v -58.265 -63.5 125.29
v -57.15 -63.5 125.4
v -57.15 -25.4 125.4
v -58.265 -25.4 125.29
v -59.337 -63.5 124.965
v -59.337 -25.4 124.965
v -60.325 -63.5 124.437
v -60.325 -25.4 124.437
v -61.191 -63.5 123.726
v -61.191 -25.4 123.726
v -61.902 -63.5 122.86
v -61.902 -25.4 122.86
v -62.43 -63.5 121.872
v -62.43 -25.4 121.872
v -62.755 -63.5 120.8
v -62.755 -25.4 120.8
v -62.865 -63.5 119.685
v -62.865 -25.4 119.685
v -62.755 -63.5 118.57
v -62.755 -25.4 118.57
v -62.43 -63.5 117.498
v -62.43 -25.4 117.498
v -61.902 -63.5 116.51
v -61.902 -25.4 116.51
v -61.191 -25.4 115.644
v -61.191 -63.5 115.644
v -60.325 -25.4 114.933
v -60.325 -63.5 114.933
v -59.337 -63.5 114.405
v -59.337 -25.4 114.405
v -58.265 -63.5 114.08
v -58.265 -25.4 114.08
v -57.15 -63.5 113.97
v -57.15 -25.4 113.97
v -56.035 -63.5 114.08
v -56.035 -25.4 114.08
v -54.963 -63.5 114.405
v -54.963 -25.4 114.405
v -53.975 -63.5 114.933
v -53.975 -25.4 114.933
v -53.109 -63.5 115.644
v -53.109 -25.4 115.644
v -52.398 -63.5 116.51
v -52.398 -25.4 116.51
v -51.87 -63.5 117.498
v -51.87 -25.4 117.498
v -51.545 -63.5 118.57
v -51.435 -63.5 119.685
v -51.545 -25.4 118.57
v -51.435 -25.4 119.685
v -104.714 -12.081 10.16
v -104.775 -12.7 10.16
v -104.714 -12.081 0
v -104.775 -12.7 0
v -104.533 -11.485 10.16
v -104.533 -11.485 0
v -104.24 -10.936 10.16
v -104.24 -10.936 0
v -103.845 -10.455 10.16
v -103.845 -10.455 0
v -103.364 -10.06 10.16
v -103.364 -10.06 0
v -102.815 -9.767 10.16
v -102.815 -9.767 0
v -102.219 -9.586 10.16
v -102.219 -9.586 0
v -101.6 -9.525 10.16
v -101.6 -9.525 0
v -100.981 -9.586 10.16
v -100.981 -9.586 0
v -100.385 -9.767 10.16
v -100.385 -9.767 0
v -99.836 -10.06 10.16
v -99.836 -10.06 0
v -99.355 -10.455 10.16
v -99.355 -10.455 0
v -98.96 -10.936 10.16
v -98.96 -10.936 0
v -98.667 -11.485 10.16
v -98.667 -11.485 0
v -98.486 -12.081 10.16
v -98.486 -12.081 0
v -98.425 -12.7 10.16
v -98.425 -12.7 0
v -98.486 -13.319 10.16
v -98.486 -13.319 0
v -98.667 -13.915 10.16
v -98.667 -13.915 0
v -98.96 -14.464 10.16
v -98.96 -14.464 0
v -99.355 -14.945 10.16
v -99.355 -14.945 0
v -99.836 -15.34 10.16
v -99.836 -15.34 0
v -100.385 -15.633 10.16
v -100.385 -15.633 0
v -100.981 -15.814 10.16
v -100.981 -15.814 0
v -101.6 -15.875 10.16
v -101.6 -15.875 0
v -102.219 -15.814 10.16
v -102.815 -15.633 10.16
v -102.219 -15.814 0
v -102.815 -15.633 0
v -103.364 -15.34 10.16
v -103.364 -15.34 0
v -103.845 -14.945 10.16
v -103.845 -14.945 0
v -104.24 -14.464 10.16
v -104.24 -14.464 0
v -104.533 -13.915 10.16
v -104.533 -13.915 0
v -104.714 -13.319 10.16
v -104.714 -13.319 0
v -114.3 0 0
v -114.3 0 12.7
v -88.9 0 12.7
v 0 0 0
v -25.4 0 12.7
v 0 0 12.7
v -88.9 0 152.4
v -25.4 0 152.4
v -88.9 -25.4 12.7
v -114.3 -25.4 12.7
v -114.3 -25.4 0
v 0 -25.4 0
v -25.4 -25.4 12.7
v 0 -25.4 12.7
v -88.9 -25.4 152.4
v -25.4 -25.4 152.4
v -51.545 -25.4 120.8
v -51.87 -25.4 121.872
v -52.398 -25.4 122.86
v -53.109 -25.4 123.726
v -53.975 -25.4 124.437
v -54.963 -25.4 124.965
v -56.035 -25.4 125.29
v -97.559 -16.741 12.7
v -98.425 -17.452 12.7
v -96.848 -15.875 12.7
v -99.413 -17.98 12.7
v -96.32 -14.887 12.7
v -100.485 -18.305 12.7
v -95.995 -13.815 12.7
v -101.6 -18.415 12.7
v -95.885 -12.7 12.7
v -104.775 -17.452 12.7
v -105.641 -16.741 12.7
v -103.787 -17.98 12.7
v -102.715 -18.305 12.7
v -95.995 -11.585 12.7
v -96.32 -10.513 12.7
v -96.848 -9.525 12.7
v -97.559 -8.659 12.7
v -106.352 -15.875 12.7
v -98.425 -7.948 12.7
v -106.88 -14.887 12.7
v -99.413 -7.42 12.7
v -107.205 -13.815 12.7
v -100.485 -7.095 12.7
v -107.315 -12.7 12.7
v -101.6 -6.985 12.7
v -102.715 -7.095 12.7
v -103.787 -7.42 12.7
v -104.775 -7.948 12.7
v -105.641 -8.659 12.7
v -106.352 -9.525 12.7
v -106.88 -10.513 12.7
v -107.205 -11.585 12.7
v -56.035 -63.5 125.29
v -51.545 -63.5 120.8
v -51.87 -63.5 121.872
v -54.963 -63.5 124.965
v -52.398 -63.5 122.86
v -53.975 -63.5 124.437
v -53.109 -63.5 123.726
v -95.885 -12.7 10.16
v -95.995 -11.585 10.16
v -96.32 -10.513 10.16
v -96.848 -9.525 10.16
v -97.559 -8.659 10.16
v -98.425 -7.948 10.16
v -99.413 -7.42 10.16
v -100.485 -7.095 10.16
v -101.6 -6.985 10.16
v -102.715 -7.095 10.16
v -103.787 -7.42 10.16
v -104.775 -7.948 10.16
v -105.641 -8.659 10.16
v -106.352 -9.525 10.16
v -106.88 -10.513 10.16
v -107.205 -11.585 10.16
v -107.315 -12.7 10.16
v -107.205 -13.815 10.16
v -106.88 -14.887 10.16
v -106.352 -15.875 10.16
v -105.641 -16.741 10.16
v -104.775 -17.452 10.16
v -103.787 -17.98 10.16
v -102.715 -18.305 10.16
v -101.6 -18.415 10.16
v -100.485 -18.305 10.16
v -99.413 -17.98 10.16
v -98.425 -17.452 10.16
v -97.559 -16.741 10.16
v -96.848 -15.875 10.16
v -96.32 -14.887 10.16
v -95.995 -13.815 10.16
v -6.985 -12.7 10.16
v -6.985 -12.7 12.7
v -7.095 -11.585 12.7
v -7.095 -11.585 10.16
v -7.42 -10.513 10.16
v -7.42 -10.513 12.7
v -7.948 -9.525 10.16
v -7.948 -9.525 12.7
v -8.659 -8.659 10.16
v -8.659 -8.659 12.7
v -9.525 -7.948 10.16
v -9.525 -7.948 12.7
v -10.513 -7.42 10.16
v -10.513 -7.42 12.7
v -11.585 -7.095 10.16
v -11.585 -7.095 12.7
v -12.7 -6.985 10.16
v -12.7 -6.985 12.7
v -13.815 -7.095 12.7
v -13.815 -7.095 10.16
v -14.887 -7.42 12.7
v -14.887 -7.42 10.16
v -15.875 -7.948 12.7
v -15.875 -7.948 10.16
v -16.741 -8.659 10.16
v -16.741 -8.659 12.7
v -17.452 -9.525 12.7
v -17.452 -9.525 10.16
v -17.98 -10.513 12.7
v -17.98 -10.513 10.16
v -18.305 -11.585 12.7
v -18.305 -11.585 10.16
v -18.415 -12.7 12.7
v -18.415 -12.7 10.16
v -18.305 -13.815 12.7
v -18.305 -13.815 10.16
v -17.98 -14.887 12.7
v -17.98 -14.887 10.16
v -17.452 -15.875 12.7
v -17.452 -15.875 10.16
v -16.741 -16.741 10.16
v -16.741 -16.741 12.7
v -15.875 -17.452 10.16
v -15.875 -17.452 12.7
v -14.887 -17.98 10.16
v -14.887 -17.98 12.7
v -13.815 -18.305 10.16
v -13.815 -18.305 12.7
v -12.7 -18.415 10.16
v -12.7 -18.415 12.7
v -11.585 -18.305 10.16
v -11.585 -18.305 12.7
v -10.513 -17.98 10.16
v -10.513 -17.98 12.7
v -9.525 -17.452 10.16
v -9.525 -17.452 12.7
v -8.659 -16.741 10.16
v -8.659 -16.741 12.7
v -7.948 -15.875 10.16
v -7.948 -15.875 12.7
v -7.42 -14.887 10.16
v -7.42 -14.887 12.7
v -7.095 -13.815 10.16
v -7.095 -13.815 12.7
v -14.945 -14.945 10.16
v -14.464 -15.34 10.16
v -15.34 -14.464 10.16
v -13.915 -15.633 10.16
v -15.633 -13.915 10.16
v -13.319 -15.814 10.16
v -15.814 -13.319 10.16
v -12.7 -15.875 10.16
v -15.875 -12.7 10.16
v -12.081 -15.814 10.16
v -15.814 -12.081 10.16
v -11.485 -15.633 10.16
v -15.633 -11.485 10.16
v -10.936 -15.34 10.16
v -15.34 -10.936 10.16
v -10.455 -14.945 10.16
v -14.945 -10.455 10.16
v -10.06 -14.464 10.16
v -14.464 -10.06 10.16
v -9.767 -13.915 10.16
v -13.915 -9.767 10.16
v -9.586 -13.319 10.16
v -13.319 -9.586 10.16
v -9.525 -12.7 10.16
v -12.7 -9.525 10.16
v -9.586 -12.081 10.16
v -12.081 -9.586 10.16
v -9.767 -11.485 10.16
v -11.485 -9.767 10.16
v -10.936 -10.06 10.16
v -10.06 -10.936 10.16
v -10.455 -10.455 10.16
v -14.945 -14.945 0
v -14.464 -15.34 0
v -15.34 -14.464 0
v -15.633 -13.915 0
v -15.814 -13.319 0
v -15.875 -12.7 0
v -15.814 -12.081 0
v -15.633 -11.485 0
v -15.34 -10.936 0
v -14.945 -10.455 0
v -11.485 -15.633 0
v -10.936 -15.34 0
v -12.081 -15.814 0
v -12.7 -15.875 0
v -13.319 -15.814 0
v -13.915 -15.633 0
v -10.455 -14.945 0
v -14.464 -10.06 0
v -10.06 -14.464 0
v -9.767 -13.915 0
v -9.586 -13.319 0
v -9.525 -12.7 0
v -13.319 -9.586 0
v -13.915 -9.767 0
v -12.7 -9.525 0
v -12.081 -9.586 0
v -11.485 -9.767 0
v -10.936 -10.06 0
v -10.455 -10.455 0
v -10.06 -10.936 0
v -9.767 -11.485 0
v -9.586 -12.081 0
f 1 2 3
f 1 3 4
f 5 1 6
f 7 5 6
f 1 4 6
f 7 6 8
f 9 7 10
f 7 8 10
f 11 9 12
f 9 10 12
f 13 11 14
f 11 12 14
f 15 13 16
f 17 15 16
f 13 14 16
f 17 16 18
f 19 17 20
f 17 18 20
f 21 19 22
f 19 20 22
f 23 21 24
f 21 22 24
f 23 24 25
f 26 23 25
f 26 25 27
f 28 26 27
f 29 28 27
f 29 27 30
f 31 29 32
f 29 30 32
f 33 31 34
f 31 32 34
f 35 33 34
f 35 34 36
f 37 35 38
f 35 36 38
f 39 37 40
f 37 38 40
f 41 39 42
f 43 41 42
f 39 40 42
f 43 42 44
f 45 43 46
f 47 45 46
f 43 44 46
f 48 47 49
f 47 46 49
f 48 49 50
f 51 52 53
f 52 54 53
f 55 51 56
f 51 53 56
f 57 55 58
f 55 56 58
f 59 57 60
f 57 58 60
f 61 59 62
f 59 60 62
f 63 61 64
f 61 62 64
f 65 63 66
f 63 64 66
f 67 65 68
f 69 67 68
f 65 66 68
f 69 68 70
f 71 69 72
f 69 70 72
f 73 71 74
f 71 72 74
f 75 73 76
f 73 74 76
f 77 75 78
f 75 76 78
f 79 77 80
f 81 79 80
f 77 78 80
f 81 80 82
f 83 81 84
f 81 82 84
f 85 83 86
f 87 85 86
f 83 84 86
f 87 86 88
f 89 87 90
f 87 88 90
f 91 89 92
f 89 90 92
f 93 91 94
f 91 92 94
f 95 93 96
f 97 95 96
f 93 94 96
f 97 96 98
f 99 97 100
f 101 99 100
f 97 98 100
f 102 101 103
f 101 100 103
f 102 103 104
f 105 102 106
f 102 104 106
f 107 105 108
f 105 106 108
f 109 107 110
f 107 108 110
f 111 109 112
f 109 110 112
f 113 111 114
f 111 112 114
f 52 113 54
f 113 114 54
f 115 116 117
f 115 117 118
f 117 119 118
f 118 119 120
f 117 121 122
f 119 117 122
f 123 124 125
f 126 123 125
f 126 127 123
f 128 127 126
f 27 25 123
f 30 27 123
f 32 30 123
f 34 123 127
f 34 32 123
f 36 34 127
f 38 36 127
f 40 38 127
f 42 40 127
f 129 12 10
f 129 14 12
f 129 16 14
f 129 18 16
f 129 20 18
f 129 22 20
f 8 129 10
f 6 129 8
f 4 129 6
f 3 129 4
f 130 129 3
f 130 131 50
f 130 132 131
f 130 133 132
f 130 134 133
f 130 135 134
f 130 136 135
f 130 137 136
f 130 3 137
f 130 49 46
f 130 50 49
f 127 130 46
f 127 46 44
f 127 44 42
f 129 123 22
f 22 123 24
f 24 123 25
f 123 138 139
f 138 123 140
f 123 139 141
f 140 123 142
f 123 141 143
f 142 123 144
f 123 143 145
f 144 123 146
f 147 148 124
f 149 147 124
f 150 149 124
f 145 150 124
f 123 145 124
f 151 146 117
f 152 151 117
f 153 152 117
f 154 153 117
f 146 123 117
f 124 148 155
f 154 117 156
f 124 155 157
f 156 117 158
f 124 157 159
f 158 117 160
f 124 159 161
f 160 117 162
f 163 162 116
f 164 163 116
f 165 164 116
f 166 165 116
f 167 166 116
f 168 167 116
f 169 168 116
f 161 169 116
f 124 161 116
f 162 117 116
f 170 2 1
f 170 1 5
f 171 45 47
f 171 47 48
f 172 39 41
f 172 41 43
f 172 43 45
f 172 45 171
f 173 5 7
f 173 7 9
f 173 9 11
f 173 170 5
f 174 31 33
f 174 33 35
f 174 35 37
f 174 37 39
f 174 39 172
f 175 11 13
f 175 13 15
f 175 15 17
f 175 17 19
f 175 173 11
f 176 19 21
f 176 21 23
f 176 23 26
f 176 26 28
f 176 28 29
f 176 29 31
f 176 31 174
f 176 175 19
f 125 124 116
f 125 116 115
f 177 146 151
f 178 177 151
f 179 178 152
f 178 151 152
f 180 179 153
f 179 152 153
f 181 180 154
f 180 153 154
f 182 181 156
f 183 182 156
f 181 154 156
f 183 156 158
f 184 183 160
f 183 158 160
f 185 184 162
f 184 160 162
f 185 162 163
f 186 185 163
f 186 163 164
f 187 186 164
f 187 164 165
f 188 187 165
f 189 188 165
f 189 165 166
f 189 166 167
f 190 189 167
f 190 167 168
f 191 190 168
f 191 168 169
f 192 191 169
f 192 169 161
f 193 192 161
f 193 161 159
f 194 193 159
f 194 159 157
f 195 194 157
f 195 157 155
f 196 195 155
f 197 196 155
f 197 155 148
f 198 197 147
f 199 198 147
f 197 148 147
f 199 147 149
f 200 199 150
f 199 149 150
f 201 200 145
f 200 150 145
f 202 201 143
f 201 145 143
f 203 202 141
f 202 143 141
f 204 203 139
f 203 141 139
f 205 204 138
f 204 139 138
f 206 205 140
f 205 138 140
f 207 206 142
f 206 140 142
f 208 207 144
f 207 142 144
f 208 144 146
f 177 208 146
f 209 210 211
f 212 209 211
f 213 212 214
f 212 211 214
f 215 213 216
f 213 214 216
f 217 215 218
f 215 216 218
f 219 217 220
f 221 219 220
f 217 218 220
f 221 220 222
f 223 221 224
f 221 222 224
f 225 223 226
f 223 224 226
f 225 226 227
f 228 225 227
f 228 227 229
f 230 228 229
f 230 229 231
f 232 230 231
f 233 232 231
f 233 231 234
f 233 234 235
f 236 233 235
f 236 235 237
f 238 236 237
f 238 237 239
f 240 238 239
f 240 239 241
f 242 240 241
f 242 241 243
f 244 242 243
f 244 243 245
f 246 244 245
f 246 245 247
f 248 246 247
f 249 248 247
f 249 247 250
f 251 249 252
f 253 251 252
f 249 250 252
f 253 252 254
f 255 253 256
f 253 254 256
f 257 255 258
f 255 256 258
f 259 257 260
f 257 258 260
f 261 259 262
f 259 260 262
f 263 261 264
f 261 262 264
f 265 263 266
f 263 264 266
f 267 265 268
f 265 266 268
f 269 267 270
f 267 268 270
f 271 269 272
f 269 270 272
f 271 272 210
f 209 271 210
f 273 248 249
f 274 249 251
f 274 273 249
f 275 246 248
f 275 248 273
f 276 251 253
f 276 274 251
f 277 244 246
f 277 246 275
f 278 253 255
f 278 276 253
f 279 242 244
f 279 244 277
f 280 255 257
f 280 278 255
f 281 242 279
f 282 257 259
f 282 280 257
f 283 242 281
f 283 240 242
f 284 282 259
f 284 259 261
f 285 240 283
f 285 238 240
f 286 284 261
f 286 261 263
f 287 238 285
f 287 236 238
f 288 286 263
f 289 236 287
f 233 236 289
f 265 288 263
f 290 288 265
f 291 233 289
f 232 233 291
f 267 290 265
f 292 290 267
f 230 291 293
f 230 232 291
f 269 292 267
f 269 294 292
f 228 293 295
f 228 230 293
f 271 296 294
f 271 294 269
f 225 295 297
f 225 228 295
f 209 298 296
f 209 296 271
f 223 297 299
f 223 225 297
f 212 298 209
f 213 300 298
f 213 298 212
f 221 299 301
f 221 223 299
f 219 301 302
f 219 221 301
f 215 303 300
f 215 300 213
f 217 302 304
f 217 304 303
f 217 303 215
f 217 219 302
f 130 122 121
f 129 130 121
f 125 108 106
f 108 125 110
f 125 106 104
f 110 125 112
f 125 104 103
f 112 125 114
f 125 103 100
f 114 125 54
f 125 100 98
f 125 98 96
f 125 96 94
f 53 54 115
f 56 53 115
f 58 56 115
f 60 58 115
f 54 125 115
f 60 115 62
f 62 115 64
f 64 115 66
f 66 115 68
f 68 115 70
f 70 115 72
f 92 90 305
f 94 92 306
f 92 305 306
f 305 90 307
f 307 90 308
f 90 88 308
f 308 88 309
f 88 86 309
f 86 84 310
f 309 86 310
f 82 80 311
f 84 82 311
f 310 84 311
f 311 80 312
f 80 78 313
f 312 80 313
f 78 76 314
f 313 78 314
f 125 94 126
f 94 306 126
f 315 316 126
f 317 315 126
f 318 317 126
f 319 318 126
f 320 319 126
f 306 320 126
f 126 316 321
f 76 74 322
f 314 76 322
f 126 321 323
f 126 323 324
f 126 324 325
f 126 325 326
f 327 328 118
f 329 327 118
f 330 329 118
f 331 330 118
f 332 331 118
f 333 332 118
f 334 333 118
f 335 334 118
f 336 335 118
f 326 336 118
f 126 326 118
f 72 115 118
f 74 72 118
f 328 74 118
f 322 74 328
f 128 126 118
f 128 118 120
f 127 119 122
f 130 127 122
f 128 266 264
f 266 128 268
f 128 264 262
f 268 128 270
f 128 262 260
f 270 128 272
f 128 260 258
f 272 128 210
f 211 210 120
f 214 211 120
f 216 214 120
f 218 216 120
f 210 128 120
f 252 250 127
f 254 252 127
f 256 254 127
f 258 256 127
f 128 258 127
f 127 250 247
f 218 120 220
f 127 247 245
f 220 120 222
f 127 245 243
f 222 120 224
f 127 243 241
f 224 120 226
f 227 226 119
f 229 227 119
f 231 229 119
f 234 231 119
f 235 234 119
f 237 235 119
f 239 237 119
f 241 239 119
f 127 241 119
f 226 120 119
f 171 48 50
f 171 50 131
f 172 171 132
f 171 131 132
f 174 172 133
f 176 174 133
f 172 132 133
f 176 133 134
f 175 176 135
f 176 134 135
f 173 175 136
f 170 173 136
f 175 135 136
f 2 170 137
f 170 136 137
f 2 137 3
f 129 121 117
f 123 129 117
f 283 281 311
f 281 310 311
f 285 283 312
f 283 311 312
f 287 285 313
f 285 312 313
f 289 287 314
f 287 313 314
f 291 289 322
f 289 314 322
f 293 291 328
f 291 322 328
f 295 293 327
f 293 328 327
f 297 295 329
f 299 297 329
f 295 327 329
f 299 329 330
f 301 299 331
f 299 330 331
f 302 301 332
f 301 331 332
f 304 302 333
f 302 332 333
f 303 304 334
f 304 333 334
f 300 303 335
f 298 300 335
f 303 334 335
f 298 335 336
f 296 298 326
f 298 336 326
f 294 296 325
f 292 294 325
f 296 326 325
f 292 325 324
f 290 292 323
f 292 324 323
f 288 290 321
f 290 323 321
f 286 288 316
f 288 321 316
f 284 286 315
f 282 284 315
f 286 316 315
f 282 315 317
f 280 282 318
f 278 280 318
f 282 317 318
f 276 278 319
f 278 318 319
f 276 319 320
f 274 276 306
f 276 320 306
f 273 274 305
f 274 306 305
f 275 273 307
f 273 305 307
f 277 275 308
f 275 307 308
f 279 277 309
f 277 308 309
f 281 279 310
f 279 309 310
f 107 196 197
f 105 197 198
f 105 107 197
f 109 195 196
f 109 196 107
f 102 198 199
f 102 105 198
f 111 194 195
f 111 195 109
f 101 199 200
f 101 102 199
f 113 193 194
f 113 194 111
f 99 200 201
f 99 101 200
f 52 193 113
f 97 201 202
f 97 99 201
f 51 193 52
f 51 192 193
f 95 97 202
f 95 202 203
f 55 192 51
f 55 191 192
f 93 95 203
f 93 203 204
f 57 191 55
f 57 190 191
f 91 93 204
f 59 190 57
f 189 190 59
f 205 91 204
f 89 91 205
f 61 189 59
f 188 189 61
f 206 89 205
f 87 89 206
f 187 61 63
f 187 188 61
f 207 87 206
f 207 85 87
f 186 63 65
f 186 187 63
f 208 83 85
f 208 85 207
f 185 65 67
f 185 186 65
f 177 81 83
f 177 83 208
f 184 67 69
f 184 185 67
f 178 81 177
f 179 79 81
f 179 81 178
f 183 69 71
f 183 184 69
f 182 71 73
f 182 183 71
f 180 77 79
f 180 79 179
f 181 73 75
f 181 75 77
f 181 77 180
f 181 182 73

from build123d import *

# Parameters (mm, degrees)
F1_DEPTH       = 25.4
F3_DEPTH       = 38.1
F5_D           = 6.35
F5_CBORE_D     = 11.43
F5_CBORE_DEPTH = 2.54


with BuildPart() as f1:
    # F0 (on Front) → F1 (new body)
    with BuildSketch(Plane.XZ):
        Polygon((-114.3, 0), (0, 0), (0, 12.7), (-25.4, 12.7), (-25.4, 152.4), (-88.9, 152.4), (-88.9, 12.7), (-114.3, 12.7), align=None)
    extrude(amount=F1_DEPTH)

    # F2 (on face) → F3 (join)
    with BuildSketch(Plane.XZ.offset(25.4)):
        with BuildLine():
            ThreePointArc((-51.435, 119.6848), (-53.108885, 123.725915), (-57.15, 125.3998))
            ThreePointArc((-57.15, 125.3998), (-61.191115, 115.643685), (-51.435, 119.6848))
        make_face()
    extrude(amount=F3_DEPTH)

    # F5 (through all)
    with Locations(Plane.XY.offset(12.7)):
        with Locations((-101.6, -12.7), (-12.7, -12.7)):
            CounterBoreHole(F5_D / 2, F5_CBORE_D / 2, F5_CBORE_DEPTH)


solid = f1.part
